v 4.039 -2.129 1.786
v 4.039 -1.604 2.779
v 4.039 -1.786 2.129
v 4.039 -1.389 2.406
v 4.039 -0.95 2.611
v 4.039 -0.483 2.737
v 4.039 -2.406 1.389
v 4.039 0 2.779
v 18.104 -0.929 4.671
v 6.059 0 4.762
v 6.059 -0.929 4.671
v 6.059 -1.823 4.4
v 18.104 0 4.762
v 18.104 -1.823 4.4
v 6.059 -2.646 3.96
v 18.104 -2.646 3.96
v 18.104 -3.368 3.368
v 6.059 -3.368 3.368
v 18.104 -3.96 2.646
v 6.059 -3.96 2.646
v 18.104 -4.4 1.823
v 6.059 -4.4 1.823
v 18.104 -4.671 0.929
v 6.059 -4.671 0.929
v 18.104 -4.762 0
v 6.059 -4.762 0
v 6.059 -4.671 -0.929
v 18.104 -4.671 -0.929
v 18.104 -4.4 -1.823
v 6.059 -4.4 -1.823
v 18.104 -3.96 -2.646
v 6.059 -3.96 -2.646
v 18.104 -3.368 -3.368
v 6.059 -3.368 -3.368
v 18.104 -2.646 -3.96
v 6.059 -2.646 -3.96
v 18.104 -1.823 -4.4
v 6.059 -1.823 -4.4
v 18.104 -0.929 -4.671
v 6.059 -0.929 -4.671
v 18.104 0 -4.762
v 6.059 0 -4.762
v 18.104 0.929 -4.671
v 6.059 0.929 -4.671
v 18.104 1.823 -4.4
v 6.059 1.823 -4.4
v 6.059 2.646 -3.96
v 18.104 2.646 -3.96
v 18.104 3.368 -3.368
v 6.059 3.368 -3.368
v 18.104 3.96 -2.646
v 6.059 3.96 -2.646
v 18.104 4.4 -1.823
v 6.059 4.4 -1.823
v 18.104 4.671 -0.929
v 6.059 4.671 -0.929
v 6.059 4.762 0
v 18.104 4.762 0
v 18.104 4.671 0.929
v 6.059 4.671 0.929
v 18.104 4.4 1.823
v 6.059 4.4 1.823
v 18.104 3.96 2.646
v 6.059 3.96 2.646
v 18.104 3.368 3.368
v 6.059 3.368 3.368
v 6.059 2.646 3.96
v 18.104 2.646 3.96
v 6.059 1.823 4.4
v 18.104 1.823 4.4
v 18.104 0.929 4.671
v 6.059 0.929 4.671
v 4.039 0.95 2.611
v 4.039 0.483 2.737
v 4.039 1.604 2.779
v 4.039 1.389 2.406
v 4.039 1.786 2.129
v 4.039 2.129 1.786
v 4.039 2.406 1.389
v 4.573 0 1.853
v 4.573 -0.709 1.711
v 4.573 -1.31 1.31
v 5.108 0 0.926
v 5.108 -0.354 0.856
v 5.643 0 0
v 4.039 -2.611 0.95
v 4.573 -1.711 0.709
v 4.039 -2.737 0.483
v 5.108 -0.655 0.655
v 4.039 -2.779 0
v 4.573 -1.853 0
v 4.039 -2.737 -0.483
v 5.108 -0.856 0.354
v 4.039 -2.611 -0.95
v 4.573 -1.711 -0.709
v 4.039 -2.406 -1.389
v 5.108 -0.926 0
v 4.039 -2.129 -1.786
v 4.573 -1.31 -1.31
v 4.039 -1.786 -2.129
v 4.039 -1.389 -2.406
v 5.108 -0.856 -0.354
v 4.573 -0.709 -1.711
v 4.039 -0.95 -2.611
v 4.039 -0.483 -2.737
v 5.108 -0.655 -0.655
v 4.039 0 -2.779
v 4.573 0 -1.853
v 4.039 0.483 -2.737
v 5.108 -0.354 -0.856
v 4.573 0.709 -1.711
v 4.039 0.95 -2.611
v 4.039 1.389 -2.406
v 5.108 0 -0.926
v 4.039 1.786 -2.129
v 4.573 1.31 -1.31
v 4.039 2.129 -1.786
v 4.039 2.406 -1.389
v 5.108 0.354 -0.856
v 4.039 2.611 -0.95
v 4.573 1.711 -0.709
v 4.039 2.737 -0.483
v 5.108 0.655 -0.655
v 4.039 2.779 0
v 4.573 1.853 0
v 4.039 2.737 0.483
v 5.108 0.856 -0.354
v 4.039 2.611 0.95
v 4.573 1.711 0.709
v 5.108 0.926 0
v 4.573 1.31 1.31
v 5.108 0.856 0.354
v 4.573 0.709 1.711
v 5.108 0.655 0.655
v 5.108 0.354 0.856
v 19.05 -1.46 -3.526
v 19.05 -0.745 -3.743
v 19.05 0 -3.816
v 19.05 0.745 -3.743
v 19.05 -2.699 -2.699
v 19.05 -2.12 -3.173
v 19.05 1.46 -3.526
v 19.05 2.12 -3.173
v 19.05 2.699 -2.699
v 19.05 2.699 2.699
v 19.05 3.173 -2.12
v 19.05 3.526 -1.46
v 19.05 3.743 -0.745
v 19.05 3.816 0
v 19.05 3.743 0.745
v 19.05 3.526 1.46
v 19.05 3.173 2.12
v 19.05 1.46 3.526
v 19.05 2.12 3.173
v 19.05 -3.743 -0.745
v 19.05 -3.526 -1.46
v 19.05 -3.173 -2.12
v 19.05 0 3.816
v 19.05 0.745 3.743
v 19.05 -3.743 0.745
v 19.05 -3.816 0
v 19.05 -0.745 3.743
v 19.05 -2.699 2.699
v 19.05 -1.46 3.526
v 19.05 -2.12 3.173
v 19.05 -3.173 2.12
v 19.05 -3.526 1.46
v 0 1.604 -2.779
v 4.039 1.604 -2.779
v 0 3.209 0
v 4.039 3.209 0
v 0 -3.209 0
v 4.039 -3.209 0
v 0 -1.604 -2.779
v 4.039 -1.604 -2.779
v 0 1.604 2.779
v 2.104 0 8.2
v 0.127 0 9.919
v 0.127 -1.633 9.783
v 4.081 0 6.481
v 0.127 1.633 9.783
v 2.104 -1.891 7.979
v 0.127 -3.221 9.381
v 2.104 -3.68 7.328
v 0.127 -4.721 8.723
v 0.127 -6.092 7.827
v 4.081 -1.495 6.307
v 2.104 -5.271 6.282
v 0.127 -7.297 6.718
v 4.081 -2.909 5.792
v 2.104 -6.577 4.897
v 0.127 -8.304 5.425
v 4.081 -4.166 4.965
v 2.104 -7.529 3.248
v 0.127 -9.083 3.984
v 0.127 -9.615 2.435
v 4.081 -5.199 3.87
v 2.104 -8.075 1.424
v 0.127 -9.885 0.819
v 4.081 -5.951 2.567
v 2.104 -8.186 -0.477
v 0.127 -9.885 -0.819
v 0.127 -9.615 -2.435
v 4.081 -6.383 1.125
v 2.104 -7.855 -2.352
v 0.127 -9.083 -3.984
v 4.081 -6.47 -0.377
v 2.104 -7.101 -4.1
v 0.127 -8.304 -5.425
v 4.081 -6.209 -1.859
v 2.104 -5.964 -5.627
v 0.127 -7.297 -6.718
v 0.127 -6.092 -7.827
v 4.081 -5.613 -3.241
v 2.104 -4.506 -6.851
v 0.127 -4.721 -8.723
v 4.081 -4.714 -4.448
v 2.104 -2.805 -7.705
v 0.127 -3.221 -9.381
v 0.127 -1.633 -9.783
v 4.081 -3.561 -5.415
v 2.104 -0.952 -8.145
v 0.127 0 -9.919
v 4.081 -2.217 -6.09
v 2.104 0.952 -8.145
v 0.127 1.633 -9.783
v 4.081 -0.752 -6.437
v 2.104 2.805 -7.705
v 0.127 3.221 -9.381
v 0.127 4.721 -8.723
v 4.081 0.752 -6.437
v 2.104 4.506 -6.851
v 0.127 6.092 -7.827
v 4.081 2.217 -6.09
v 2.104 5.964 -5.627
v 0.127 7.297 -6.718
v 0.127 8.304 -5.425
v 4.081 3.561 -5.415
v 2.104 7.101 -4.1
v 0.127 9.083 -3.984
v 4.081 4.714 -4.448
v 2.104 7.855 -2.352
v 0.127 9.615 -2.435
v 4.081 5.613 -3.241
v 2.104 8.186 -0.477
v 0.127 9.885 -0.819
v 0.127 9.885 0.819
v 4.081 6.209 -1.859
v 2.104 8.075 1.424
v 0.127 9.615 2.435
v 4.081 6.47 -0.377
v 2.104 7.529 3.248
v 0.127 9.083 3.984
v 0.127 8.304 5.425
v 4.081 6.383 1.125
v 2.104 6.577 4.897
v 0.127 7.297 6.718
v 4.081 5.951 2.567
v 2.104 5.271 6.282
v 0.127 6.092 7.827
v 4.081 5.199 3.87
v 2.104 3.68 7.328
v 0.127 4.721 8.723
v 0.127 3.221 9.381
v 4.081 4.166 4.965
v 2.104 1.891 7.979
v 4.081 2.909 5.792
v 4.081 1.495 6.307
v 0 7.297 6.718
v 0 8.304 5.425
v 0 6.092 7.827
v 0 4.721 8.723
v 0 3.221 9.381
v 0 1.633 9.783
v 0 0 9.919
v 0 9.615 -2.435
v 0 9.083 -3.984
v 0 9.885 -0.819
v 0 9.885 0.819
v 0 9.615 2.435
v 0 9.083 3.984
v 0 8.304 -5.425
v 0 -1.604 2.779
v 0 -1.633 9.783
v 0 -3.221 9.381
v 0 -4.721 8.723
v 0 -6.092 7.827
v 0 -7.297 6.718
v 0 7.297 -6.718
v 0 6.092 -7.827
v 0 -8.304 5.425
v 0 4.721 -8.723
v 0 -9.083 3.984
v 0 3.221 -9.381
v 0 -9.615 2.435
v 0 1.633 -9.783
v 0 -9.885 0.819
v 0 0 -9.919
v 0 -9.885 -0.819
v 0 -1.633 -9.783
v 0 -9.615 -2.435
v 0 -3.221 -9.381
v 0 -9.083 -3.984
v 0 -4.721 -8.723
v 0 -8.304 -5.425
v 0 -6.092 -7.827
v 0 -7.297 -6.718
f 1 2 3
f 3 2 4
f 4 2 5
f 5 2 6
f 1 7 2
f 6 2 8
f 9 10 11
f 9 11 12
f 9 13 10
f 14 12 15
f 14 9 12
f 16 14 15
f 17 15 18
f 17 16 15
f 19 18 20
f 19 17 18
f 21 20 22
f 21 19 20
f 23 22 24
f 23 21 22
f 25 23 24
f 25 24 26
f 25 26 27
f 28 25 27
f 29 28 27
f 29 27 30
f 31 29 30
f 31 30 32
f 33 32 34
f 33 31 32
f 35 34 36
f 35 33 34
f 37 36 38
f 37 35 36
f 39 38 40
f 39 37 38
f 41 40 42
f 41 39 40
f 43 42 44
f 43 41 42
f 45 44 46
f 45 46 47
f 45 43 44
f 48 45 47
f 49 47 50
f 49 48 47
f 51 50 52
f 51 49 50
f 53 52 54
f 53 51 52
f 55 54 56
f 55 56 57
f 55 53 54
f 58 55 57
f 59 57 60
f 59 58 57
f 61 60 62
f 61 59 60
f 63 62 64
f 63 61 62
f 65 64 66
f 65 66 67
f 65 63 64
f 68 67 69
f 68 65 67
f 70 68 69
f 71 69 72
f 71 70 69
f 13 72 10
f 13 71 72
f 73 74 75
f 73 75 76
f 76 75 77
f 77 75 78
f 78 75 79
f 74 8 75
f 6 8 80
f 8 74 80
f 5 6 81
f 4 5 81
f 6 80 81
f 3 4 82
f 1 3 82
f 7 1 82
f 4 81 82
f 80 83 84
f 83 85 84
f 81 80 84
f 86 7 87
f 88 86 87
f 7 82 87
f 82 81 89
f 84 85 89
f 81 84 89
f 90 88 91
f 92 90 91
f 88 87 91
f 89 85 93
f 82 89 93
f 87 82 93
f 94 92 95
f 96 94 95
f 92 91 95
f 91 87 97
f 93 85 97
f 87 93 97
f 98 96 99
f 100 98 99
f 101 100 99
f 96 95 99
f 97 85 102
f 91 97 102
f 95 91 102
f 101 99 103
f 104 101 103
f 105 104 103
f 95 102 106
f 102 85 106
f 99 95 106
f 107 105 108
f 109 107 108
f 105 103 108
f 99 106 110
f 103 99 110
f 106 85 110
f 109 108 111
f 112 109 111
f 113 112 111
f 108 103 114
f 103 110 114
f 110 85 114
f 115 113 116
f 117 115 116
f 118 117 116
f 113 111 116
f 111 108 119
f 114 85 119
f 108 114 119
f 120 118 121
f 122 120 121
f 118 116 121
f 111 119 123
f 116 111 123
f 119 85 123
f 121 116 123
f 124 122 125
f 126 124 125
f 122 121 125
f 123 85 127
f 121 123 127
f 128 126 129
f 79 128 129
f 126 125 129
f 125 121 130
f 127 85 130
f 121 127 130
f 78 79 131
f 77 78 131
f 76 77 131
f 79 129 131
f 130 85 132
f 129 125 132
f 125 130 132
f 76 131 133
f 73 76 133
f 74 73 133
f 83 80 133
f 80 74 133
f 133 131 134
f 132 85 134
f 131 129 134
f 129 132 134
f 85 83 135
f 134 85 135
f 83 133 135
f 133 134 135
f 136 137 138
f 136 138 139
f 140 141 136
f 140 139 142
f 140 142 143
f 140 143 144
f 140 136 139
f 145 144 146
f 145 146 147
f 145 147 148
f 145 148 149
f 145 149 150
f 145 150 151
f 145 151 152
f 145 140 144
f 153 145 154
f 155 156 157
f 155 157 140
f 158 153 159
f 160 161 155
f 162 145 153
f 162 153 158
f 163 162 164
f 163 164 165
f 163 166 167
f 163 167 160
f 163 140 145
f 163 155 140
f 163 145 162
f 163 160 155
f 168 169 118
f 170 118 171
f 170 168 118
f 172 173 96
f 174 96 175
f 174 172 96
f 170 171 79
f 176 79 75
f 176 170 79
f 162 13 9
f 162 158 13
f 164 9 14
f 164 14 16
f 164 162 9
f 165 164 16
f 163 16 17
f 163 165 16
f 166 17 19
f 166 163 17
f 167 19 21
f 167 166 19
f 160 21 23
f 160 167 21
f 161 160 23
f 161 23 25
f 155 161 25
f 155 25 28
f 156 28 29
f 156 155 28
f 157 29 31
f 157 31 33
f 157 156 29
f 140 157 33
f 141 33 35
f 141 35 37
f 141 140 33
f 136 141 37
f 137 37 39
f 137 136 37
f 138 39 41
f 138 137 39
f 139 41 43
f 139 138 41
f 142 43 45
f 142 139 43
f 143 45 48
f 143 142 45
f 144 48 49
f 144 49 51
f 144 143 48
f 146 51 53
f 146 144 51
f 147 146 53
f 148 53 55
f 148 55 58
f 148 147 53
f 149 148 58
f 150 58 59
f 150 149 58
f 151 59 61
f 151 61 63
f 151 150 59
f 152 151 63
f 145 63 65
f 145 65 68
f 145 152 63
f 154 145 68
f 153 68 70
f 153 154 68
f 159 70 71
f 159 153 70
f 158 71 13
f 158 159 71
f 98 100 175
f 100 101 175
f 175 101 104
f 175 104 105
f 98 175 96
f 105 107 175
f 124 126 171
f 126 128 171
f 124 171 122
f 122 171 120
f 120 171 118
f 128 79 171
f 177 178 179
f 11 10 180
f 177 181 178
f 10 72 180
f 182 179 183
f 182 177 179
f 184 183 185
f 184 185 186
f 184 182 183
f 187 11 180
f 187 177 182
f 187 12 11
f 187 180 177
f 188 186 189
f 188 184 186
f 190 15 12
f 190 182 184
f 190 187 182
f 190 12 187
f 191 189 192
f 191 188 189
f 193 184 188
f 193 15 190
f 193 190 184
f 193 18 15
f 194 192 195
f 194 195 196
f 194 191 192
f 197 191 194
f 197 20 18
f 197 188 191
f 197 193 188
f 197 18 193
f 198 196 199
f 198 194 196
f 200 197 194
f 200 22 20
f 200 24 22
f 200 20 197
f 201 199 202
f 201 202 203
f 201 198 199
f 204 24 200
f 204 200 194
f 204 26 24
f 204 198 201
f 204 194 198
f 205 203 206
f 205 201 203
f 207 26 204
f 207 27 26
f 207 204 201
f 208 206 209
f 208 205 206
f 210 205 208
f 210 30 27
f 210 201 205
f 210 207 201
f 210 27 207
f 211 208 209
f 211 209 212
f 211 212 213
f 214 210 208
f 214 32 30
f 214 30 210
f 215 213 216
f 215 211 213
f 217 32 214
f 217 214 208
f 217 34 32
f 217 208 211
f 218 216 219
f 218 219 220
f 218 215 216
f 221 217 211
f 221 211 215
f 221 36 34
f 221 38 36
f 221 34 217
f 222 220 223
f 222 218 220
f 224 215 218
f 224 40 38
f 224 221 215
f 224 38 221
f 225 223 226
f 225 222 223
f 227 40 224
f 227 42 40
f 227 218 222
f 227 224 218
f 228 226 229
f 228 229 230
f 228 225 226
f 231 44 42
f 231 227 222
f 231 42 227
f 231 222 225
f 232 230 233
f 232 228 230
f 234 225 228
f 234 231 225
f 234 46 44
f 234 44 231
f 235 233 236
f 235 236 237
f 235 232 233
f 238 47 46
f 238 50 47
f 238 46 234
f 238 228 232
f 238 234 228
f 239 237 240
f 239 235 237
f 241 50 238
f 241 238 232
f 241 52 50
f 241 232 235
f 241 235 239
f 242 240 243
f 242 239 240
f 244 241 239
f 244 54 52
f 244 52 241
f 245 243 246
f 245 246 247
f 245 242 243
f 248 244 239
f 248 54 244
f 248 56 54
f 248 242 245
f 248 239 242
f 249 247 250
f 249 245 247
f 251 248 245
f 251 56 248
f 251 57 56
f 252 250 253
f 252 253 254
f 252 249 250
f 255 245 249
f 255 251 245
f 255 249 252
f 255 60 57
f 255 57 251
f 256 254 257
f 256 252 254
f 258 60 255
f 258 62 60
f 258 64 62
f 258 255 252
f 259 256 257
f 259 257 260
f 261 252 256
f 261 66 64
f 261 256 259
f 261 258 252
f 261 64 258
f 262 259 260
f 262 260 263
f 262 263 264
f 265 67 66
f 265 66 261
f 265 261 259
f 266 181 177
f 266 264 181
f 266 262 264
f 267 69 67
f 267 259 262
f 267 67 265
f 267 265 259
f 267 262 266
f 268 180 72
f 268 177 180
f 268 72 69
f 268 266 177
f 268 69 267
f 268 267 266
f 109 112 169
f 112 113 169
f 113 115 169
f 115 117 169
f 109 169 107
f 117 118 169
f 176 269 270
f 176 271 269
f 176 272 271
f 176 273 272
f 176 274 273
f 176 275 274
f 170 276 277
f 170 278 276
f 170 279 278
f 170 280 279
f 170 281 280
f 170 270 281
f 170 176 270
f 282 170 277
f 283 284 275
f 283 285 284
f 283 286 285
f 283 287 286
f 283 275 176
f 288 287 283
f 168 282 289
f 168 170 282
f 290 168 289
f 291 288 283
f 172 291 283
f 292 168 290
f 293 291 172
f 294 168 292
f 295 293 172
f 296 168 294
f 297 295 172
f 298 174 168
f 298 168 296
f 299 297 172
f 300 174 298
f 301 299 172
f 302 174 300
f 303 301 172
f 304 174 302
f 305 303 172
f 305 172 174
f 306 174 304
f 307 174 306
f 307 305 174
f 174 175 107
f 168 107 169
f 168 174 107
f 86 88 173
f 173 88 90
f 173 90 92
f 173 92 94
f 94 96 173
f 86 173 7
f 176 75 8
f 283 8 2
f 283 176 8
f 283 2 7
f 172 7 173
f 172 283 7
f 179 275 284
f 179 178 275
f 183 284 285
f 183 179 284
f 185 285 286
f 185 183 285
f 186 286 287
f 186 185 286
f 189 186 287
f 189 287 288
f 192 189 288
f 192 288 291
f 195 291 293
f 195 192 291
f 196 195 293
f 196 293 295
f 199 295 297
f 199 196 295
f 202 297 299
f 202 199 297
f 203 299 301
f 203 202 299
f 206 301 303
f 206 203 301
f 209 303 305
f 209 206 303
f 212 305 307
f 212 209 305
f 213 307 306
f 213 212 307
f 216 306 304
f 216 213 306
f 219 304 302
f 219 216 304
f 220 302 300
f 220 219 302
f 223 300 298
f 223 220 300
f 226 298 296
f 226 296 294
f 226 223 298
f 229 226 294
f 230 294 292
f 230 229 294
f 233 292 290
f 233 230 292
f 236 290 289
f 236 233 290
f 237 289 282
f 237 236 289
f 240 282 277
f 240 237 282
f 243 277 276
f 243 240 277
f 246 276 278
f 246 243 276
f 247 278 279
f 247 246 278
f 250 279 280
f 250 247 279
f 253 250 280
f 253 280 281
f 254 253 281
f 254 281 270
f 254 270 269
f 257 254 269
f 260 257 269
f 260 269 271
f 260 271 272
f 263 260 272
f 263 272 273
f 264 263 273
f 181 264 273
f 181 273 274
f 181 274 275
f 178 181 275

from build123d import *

# Parameters (mm, degrees)
HEX_2_DEPTH = 4.0386


with BuildPart() as part:
    # BodySke → BaseBody (revolve)
    with BuildSketch(Plane.XY, mode=Mode.PRIVATE) as basebody_sk:
        Polygon((0, 0), (0, 9.9187), (0.127, 9.9187), (6.058529581, 4.7625), (18.10385, 4.7625), (19.05, 3.81635), (19.05, 0), align=None)
    revolve(basebody_sk.sketch.rotate(Axis((0, 0, 0), (1, 0, 0)), 90), axis=Axis((0, 0, 0), (1, 0, 0)))

    # Sketch2 → PreBroach (revolve, cut)
    with BuildSketch(Plane.XY, mode=Mode.PRIVATE) as prebroach_sk:
        Polygon((0, 2.77876), (4.0386, 2.77876), (5.642917834, 0), (0, 0), align=None)
    revolve(prebroach_sk.sketch.rotate(Axis((0, 0, 0), (1, 0, 0)), 90), axis=Axis((0, 0, 0), (1, 0, 0)), mode=Mode.SUBTRACT)

    # Sketch3 → Hex 2 (cut)
    with BuildSketch(Plane.ZY):
        Polygon((-2.77876, -1.604317834), (-2.77876, 1.604317834), (0, 3.208635668), (2.77876, 1.604317834), (2.77876, -1.604317834), (0, -3.208635668), align=None)
    extrude(amount=-HEX_2_DEPTH, mode=Mode.SUBTRACT)


solid = part.part
